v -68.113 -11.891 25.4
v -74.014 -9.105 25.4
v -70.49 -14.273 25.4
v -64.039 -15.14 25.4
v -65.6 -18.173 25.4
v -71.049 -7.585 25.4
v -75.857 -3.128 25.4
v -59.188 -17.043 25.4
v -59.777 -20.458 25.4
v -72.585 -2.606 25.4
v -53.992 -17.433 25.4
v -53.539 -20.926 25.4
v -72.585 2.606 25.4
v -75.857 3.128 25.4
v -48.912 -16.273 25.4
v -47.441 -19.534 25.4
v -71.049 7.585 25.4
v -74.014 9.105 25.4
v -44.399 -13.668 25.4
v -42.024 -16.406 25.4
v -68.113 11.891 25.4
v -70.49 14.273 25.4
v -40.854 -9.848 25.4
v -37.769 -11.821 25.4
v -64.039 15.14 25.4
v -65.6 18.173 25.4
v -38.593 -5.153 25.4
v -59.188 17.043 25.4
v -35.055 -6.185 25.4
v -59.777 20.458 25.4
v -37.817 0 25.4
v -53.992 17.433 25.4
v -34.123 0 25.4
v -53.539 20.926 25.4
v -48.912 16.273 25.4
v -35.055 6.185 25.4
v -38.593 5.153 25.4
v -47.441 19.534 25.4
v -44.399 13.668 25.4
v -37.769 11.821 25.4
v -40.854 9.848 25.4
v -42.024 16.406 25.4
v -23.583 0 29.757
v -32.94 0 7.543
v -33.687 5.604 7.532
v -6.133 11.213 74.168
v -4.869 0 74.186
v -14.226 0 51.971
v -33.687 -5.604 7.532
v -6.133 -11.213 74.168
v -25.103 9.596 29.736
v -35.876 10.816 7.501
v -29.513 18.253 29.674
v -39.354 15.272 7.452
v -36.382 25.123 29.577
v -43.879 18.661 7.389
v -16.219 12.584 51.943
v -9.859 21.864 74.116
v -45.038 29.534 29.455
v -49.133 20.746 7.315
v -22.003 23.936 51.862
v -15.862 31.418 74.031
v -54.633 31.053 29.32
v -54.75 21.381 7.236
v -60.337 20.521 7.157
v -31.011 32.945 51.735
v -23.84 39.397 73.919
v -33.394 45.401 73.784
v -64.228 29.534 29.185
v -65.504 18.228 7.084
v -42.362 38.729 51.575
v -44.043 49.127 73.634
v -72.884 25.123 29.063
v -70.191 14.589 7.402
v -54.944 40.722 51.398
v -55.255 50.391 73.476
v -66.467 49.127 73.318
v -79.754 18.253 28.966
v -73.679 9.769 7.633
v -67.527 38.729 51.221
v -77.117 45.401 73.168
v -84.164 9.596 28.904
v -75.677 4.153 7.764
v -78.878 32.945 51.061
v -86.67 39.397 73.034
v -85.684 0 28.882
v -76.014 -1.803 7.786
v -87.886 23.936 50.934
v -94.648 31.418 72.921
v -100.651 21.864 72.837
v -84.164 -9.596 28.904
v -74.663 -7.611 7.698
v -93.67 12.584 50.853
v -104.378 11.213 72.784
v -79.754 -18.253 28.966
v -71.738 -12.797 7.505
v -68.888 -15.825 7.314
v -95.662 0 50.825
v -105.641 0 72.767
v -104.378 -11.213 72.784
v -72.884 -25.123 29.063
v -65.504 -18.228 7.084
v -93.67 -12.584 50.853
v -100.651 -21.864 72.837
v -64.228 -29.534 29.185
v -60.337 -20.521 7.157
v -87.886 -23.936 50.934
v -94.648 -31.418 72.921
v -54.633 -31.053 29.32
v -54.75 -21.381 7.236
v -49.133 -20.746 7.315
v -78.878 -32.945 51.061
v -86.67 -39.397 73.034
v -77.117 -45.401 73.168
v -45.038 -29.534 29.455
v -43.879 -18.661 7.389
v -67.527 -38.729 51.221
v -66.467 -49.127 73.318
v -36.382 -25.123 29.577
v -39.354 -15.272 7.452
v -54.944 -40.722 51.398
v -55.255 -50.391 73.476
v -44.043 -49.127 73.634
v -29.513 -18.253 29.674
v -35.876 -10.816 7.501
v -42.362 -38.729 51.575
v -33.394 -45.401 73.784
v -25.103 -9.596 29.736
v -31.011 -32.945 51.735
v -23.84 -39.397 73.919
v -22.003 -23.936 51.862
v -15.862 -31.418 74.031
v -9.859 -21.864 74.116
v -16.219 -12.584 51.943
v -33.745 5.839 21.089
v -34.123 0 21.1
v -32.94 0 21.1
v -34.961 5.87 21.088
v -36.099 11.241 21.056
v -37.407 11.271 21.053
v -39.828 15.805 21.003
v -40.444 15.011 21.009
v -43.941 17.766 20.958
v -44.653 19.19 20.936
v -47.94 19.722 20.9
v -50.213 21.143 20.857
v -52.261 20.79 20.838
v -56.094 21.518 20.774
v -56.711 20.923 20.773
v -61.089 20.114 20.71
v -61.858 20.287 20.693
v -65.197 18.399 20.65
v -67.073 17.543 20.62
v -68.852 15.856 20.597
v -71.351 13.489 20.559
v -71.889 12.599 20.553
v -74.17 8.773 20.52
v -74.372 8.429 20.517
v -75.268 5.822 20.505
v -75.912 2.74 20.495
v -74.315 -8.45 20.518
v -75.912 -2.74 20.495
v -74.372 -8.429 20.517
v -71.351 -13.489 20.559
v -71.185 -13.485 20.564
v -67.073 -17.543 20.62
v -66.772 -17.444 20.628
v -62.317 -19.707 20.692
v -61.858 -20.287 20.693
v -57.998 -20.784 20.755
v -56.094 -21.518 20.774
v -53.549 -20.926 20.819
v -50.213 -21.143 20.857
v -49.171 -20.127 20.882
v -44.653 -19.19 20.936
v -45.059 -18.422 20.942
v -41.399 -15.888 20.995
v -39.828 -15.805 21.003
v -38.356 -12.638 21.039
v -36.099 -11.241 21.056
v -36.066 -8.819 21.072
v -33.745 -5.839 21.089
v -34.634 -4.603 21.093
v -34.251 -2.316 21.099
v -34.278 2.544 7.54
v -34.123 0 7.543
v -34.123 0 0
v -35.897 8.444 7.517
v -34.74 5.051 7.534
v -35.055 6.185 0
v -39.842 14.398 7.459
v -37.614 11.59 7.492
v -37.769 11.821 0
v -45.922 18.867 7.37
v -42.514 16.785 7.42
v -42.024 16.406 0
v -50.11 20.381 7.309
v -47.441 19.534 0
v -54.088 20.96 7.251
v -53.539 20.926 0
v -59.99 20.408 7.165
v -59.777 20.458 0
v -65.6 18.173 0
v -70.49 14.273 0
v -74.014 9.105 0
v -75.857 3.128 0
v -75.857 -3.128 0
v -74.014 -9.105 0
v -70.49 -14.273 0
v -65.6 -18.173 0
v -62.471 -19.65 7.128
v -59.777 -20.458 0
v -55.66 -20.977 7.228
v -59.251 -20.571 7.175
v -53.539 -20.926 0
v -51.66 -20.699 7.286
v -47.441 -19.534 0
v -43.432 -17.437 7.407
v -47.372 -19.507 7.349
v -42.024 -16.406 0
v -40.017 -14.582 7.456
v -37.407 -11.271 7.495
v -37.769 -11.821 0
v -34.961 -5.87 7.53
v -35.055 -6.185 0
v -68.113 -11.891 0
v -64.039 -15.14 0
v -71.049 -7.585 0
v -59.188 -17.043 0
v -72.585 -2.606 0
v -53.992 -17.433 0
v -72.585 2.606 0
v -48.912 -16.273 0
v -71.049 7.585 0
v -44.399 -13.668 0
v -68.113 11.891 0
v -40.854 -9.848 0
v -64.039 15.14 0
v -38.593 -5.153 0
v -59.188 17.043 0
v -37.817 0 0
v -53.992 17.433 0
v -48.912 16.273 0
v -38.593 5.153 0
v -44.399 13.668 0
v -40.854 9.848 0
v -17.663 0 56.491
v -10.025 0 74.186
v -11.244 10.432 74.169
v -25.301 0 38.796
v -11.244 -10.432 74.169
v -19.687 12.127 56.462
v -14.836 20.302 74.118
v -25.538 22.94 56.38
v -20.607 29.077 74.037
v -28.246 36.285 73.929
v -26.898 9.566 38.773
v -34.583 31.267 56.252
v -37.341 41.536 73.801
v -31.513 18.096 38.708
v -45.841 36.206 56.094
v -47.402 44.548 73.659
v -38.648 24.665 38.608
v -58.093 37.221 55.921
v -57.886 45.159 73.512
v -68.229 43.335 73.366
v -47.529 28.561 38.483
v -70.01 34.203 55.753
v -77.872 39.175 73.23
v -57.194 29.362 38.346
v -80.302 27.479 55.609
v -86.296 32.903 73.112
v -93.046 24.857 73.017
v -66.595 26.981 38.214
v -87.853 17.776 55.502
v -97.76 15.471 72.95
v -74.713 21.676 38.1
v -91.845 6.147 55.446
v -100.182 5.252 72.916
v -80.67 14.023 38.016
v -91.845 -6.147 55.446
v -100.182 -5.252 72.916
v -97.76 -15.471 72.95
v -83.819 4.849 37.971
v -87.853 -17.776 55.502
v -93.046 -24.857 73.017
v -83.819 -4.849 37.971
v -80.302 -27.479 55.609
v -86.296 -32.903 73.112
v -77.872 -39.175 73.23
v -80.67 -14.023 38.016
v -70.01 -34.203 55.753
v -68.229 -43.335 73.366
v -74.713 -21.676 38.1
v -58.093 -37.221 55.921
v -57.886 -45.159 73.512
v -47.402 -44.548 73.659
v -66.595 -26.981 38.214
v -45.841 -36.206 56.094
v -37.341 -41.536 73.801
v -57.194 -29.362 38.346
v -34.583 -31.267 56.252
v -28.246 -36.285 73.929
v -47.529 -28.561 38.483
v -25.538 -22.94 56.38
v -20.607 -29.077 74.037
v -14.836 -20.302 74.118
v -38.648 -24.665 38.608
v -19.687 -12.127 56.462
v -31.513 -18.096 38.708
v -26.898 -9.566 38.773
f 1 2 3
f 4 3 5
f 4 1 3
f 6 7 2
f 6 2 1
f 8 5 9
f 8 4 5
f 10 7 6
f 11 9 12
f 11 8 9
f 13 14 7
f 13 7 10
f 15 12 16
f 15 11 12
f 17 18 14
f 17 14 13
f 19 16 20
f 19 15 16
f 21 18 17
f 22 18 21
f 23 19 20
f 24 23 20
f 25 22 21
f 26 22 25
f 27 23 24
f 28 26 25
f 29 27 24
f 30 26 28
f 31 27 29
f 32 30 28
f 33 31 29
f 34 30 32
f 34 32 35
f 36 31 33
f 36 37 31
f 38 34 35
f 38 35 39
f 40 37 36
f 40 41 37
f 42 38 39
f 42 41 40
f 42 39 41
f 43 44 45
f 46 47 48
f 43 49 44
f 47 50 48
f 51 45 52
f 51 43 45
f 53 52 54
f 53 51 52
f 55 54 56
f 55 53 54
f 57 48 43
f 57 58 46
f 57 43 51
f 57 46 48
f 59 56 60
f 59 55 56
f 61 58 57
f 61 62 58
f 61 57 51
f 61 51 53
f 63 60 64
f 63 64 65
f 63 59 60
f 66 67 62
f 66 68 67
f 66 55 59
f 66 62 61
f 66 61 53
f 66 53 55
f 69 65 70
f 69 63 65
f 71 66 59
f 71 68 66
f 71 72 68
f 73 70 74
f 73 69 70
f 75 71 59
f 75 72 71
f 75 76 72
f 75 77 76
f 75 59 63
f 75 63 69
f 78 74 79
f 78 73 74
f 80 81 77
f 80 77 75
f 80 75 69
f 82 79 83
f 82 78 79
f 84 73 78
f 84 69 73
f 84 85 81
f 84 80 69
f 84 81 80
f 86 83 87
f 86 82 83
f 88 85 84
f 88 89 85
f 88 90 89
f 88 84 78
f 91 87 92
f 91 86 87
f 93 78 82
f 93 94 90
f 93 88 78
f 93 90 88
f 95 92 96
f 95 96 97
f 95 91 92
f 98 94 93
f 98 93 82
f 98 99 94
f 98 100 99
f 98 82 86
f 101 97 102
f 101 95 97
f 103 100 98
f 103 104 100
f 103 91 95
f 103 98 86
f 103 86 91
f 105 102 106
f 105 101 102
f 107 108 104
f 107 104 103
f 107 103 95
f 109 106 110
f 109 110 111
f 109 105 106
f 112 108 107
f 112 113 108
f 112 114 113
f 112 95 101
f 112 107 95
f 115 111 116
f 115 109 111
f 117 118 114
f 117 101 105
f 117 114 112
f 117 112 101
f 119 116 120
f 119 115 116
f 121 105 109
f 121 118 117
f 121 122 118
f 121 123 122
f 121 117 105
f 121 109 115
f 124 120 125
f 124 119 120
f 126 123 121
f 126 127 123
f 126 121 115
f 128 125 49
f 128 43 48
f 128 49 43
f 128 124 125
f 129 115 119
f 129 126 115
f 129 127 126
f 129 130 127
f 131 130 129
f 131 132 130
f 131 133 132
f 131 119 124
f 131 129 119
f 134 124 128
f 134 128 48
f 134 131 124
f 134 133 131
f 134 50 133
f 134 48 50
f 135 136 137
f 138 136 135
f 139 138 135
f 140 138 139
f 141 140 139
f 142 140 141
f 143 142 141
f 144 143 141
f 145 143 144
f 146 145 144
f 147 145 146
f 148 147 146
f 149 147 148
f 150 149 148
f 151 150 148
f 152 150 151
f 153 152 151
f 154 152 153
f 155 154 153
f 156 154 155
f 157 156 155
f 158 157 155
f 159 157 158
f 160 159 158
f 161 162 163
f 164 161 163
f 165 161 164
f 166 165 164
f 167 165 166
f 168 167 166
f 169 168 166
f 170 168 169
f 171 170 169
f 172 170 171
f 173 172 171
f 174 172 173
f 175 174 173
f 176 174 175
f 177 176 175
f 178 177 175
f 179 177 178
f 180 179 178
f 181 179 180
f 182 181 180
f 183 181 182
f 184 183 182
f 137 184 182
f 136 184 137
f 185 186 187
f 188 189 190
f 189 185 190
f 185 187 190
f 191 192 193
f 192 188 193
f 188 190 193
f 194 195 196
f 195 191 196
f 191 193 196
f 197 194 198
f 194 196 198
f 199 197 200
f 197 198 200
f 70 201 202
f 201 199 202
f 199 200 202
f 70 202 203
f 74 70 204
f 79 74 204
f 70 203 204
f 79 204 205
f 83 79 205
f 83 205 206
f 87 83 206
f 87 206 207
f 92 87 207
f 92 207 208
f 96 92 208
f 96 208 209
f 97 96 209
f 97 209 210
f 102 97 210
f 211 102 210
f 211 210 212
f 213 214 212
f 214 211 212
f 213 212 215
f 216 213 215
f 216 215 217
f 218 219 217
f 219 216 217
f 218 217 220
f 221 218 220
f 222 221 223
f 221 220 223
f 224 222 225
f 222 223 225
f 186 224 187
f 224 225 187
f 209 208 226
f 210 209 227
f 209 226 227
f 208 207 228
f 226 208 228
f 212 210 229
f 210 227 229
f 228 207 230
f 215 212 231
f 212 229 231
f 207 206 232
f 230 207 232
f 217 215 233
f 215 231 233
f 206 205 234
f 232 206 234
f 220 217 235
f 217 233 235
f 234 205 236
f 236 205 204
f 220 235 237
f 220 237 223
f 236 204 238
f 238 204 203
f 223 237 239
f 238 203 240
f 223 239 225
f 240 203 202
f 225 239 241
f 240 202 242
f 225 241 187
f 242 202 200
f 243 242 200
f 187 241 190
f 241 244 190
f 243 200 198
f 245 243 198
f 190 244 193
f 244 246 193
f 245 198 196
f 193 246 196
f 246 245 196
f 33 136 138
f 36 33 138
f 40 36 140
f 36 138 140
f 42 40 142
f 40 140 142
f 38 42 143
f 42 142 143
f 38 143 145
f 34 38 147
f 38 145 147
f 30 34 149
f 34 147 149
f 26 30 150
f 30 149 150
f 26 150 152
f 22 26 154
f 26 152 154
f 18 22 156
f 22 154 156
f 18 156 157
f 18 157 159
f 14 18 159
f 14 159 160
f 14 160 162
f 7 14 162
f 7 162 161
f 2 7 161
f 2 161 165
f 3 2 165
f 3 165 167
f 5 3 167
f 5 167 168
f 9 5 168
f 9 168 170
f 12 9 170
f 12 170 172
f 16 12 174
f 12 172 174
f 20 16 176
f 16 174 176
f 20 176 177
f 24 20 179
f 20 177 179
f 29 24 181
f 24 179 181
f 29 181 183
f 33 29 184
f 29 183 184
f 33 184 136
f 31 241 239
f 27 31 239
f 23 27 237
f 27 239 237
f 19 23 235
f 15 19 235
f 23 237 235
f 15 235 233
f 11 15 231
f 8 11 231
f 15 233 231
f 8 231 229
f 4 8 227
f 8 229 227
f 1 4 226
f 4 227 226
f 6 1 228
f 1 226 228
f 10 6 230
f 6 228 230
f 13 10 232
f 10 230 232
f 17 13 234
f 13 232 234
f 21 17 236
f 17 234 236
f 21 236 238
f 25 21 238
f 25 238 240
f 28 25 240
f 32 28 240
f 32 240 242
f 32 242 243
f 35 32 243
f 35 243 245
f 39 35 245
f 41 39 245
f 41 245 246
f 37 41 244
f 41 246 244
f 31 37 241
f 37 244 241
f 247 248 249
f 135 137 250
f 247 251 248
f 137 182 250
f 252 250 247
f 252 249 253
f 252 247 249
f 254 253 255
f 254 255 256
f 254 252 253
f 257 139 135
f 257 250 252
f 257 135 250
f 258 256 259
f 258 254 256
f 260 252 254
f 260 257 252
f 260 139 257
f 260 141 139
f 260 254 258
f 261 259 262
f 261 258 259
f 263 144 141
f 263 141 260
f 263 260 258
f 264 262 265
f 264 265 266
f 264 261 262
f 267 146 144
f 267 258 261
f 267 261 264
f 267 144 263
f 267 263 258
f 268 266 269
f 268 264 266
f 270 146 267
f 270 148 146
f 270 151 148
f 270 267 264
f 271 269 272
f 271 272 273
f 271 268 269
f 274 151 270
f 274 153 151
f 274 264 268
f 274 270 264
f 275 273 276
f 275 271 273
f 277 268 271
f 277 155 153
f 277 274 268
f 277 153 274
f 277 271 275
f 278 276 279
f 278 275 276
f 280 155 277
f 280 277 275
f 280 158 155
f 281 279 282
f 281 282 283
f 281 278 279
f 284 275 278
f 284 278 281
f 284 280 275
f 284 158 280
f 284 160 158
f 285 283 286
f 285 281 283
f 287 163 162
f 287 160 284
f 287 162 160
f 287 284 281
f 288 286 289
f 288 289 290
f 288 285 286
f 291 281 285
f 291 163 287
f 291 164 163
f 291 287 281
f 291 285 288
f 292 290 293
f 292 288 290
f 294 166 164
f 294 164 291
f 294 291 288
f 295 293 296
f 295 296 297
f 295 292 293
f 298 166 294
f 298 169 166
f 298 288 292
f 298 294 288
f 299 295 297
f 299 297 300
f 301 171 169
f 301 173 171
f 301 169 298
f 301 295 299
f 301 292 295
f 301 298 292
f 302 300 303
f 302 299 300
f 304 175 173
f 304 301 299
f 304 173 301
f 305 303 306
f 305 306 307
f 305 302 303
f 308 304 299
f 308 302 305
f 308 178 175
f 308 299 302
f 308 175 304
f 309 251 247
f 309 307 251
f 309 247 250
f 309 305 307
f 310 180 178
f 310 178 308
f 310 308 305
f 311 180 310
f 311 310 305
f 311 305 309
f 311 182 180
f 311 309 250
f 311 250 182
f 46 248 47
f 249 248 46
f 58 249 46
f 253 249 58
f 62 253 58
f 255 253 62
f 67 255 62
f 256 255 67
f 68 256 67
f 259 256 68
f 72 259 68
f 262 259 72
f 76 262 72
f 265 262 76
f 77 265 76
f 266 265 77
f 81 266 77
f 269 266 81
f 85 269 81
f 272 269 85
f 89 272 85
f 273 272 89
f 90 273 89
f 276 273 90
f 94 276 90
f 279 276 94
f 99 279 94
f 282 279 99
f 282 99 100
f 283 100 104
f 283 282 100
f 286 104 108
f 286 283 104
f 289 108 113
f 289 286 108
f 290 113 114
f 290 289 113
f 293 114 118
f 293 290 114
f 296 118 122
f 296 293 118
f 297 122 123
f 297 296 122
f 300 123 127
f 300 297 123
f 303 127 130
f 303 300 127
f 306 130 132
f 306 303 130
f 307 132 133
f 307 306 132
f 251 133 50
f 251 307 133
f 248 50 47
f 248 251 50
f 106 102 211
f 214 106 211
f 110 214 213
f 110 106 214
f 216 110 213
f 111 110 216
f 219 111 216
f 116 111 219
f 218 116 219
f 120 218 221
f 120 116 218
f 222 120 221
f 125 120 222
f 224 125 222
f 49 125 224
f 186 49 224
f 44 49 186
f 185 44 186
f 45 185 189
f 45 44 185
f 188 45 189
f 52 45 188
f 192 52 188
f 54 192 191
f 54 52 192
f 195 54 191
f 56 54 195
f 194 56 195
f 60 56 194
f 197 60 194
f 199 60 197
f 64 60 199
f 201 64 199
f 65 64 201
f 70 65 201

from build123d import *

# Parameters (mm, degrees)
F2_R     = 20.9843875465
F3_DEPTH = 25.4
F5_R     = 17.4817395379
F6_DEPTH = 25.4


with BuildPart() as f1:
    # F0 (on Front) → F1 (revolve)
    with BuildSketch(Plane.XZ):
        Polygon((-32.9396761954, 21.1004912853), (-54.5175522566, 21.1004912853), (-54.3266013265, 7.5427088886), (-32.9396761954, 7.5427088886), (-4.8693441786, 74.185885489), (-10.025119409, 74.185885489), align=None)
    revolve(axis=Axis((-54.4220767915, 0, 14.321600087), (-0.0140828336, 0, 0.999900832)))

    # F2 (on Top) → F3 (join)
    with BuildSketch(Plane.XY):
        with Locations((-55.1074631512, 0)):
            Circle(F2_R)
    extrude(amount=F3_DEPTH)

    # F5 (on face) → F6 (cut)
    with BuildSketch(Plane(origin=(0, 0, 0), x_dir=(1, 0, 0), z_dir=(0, 0, -1))):
        with Locations((-55.2984140813, 0)):
            Circle(F5_R)
    extrude(amount=-F6_DEPTH, mode=Mode.SUBTRACT)


solid = f1.part
